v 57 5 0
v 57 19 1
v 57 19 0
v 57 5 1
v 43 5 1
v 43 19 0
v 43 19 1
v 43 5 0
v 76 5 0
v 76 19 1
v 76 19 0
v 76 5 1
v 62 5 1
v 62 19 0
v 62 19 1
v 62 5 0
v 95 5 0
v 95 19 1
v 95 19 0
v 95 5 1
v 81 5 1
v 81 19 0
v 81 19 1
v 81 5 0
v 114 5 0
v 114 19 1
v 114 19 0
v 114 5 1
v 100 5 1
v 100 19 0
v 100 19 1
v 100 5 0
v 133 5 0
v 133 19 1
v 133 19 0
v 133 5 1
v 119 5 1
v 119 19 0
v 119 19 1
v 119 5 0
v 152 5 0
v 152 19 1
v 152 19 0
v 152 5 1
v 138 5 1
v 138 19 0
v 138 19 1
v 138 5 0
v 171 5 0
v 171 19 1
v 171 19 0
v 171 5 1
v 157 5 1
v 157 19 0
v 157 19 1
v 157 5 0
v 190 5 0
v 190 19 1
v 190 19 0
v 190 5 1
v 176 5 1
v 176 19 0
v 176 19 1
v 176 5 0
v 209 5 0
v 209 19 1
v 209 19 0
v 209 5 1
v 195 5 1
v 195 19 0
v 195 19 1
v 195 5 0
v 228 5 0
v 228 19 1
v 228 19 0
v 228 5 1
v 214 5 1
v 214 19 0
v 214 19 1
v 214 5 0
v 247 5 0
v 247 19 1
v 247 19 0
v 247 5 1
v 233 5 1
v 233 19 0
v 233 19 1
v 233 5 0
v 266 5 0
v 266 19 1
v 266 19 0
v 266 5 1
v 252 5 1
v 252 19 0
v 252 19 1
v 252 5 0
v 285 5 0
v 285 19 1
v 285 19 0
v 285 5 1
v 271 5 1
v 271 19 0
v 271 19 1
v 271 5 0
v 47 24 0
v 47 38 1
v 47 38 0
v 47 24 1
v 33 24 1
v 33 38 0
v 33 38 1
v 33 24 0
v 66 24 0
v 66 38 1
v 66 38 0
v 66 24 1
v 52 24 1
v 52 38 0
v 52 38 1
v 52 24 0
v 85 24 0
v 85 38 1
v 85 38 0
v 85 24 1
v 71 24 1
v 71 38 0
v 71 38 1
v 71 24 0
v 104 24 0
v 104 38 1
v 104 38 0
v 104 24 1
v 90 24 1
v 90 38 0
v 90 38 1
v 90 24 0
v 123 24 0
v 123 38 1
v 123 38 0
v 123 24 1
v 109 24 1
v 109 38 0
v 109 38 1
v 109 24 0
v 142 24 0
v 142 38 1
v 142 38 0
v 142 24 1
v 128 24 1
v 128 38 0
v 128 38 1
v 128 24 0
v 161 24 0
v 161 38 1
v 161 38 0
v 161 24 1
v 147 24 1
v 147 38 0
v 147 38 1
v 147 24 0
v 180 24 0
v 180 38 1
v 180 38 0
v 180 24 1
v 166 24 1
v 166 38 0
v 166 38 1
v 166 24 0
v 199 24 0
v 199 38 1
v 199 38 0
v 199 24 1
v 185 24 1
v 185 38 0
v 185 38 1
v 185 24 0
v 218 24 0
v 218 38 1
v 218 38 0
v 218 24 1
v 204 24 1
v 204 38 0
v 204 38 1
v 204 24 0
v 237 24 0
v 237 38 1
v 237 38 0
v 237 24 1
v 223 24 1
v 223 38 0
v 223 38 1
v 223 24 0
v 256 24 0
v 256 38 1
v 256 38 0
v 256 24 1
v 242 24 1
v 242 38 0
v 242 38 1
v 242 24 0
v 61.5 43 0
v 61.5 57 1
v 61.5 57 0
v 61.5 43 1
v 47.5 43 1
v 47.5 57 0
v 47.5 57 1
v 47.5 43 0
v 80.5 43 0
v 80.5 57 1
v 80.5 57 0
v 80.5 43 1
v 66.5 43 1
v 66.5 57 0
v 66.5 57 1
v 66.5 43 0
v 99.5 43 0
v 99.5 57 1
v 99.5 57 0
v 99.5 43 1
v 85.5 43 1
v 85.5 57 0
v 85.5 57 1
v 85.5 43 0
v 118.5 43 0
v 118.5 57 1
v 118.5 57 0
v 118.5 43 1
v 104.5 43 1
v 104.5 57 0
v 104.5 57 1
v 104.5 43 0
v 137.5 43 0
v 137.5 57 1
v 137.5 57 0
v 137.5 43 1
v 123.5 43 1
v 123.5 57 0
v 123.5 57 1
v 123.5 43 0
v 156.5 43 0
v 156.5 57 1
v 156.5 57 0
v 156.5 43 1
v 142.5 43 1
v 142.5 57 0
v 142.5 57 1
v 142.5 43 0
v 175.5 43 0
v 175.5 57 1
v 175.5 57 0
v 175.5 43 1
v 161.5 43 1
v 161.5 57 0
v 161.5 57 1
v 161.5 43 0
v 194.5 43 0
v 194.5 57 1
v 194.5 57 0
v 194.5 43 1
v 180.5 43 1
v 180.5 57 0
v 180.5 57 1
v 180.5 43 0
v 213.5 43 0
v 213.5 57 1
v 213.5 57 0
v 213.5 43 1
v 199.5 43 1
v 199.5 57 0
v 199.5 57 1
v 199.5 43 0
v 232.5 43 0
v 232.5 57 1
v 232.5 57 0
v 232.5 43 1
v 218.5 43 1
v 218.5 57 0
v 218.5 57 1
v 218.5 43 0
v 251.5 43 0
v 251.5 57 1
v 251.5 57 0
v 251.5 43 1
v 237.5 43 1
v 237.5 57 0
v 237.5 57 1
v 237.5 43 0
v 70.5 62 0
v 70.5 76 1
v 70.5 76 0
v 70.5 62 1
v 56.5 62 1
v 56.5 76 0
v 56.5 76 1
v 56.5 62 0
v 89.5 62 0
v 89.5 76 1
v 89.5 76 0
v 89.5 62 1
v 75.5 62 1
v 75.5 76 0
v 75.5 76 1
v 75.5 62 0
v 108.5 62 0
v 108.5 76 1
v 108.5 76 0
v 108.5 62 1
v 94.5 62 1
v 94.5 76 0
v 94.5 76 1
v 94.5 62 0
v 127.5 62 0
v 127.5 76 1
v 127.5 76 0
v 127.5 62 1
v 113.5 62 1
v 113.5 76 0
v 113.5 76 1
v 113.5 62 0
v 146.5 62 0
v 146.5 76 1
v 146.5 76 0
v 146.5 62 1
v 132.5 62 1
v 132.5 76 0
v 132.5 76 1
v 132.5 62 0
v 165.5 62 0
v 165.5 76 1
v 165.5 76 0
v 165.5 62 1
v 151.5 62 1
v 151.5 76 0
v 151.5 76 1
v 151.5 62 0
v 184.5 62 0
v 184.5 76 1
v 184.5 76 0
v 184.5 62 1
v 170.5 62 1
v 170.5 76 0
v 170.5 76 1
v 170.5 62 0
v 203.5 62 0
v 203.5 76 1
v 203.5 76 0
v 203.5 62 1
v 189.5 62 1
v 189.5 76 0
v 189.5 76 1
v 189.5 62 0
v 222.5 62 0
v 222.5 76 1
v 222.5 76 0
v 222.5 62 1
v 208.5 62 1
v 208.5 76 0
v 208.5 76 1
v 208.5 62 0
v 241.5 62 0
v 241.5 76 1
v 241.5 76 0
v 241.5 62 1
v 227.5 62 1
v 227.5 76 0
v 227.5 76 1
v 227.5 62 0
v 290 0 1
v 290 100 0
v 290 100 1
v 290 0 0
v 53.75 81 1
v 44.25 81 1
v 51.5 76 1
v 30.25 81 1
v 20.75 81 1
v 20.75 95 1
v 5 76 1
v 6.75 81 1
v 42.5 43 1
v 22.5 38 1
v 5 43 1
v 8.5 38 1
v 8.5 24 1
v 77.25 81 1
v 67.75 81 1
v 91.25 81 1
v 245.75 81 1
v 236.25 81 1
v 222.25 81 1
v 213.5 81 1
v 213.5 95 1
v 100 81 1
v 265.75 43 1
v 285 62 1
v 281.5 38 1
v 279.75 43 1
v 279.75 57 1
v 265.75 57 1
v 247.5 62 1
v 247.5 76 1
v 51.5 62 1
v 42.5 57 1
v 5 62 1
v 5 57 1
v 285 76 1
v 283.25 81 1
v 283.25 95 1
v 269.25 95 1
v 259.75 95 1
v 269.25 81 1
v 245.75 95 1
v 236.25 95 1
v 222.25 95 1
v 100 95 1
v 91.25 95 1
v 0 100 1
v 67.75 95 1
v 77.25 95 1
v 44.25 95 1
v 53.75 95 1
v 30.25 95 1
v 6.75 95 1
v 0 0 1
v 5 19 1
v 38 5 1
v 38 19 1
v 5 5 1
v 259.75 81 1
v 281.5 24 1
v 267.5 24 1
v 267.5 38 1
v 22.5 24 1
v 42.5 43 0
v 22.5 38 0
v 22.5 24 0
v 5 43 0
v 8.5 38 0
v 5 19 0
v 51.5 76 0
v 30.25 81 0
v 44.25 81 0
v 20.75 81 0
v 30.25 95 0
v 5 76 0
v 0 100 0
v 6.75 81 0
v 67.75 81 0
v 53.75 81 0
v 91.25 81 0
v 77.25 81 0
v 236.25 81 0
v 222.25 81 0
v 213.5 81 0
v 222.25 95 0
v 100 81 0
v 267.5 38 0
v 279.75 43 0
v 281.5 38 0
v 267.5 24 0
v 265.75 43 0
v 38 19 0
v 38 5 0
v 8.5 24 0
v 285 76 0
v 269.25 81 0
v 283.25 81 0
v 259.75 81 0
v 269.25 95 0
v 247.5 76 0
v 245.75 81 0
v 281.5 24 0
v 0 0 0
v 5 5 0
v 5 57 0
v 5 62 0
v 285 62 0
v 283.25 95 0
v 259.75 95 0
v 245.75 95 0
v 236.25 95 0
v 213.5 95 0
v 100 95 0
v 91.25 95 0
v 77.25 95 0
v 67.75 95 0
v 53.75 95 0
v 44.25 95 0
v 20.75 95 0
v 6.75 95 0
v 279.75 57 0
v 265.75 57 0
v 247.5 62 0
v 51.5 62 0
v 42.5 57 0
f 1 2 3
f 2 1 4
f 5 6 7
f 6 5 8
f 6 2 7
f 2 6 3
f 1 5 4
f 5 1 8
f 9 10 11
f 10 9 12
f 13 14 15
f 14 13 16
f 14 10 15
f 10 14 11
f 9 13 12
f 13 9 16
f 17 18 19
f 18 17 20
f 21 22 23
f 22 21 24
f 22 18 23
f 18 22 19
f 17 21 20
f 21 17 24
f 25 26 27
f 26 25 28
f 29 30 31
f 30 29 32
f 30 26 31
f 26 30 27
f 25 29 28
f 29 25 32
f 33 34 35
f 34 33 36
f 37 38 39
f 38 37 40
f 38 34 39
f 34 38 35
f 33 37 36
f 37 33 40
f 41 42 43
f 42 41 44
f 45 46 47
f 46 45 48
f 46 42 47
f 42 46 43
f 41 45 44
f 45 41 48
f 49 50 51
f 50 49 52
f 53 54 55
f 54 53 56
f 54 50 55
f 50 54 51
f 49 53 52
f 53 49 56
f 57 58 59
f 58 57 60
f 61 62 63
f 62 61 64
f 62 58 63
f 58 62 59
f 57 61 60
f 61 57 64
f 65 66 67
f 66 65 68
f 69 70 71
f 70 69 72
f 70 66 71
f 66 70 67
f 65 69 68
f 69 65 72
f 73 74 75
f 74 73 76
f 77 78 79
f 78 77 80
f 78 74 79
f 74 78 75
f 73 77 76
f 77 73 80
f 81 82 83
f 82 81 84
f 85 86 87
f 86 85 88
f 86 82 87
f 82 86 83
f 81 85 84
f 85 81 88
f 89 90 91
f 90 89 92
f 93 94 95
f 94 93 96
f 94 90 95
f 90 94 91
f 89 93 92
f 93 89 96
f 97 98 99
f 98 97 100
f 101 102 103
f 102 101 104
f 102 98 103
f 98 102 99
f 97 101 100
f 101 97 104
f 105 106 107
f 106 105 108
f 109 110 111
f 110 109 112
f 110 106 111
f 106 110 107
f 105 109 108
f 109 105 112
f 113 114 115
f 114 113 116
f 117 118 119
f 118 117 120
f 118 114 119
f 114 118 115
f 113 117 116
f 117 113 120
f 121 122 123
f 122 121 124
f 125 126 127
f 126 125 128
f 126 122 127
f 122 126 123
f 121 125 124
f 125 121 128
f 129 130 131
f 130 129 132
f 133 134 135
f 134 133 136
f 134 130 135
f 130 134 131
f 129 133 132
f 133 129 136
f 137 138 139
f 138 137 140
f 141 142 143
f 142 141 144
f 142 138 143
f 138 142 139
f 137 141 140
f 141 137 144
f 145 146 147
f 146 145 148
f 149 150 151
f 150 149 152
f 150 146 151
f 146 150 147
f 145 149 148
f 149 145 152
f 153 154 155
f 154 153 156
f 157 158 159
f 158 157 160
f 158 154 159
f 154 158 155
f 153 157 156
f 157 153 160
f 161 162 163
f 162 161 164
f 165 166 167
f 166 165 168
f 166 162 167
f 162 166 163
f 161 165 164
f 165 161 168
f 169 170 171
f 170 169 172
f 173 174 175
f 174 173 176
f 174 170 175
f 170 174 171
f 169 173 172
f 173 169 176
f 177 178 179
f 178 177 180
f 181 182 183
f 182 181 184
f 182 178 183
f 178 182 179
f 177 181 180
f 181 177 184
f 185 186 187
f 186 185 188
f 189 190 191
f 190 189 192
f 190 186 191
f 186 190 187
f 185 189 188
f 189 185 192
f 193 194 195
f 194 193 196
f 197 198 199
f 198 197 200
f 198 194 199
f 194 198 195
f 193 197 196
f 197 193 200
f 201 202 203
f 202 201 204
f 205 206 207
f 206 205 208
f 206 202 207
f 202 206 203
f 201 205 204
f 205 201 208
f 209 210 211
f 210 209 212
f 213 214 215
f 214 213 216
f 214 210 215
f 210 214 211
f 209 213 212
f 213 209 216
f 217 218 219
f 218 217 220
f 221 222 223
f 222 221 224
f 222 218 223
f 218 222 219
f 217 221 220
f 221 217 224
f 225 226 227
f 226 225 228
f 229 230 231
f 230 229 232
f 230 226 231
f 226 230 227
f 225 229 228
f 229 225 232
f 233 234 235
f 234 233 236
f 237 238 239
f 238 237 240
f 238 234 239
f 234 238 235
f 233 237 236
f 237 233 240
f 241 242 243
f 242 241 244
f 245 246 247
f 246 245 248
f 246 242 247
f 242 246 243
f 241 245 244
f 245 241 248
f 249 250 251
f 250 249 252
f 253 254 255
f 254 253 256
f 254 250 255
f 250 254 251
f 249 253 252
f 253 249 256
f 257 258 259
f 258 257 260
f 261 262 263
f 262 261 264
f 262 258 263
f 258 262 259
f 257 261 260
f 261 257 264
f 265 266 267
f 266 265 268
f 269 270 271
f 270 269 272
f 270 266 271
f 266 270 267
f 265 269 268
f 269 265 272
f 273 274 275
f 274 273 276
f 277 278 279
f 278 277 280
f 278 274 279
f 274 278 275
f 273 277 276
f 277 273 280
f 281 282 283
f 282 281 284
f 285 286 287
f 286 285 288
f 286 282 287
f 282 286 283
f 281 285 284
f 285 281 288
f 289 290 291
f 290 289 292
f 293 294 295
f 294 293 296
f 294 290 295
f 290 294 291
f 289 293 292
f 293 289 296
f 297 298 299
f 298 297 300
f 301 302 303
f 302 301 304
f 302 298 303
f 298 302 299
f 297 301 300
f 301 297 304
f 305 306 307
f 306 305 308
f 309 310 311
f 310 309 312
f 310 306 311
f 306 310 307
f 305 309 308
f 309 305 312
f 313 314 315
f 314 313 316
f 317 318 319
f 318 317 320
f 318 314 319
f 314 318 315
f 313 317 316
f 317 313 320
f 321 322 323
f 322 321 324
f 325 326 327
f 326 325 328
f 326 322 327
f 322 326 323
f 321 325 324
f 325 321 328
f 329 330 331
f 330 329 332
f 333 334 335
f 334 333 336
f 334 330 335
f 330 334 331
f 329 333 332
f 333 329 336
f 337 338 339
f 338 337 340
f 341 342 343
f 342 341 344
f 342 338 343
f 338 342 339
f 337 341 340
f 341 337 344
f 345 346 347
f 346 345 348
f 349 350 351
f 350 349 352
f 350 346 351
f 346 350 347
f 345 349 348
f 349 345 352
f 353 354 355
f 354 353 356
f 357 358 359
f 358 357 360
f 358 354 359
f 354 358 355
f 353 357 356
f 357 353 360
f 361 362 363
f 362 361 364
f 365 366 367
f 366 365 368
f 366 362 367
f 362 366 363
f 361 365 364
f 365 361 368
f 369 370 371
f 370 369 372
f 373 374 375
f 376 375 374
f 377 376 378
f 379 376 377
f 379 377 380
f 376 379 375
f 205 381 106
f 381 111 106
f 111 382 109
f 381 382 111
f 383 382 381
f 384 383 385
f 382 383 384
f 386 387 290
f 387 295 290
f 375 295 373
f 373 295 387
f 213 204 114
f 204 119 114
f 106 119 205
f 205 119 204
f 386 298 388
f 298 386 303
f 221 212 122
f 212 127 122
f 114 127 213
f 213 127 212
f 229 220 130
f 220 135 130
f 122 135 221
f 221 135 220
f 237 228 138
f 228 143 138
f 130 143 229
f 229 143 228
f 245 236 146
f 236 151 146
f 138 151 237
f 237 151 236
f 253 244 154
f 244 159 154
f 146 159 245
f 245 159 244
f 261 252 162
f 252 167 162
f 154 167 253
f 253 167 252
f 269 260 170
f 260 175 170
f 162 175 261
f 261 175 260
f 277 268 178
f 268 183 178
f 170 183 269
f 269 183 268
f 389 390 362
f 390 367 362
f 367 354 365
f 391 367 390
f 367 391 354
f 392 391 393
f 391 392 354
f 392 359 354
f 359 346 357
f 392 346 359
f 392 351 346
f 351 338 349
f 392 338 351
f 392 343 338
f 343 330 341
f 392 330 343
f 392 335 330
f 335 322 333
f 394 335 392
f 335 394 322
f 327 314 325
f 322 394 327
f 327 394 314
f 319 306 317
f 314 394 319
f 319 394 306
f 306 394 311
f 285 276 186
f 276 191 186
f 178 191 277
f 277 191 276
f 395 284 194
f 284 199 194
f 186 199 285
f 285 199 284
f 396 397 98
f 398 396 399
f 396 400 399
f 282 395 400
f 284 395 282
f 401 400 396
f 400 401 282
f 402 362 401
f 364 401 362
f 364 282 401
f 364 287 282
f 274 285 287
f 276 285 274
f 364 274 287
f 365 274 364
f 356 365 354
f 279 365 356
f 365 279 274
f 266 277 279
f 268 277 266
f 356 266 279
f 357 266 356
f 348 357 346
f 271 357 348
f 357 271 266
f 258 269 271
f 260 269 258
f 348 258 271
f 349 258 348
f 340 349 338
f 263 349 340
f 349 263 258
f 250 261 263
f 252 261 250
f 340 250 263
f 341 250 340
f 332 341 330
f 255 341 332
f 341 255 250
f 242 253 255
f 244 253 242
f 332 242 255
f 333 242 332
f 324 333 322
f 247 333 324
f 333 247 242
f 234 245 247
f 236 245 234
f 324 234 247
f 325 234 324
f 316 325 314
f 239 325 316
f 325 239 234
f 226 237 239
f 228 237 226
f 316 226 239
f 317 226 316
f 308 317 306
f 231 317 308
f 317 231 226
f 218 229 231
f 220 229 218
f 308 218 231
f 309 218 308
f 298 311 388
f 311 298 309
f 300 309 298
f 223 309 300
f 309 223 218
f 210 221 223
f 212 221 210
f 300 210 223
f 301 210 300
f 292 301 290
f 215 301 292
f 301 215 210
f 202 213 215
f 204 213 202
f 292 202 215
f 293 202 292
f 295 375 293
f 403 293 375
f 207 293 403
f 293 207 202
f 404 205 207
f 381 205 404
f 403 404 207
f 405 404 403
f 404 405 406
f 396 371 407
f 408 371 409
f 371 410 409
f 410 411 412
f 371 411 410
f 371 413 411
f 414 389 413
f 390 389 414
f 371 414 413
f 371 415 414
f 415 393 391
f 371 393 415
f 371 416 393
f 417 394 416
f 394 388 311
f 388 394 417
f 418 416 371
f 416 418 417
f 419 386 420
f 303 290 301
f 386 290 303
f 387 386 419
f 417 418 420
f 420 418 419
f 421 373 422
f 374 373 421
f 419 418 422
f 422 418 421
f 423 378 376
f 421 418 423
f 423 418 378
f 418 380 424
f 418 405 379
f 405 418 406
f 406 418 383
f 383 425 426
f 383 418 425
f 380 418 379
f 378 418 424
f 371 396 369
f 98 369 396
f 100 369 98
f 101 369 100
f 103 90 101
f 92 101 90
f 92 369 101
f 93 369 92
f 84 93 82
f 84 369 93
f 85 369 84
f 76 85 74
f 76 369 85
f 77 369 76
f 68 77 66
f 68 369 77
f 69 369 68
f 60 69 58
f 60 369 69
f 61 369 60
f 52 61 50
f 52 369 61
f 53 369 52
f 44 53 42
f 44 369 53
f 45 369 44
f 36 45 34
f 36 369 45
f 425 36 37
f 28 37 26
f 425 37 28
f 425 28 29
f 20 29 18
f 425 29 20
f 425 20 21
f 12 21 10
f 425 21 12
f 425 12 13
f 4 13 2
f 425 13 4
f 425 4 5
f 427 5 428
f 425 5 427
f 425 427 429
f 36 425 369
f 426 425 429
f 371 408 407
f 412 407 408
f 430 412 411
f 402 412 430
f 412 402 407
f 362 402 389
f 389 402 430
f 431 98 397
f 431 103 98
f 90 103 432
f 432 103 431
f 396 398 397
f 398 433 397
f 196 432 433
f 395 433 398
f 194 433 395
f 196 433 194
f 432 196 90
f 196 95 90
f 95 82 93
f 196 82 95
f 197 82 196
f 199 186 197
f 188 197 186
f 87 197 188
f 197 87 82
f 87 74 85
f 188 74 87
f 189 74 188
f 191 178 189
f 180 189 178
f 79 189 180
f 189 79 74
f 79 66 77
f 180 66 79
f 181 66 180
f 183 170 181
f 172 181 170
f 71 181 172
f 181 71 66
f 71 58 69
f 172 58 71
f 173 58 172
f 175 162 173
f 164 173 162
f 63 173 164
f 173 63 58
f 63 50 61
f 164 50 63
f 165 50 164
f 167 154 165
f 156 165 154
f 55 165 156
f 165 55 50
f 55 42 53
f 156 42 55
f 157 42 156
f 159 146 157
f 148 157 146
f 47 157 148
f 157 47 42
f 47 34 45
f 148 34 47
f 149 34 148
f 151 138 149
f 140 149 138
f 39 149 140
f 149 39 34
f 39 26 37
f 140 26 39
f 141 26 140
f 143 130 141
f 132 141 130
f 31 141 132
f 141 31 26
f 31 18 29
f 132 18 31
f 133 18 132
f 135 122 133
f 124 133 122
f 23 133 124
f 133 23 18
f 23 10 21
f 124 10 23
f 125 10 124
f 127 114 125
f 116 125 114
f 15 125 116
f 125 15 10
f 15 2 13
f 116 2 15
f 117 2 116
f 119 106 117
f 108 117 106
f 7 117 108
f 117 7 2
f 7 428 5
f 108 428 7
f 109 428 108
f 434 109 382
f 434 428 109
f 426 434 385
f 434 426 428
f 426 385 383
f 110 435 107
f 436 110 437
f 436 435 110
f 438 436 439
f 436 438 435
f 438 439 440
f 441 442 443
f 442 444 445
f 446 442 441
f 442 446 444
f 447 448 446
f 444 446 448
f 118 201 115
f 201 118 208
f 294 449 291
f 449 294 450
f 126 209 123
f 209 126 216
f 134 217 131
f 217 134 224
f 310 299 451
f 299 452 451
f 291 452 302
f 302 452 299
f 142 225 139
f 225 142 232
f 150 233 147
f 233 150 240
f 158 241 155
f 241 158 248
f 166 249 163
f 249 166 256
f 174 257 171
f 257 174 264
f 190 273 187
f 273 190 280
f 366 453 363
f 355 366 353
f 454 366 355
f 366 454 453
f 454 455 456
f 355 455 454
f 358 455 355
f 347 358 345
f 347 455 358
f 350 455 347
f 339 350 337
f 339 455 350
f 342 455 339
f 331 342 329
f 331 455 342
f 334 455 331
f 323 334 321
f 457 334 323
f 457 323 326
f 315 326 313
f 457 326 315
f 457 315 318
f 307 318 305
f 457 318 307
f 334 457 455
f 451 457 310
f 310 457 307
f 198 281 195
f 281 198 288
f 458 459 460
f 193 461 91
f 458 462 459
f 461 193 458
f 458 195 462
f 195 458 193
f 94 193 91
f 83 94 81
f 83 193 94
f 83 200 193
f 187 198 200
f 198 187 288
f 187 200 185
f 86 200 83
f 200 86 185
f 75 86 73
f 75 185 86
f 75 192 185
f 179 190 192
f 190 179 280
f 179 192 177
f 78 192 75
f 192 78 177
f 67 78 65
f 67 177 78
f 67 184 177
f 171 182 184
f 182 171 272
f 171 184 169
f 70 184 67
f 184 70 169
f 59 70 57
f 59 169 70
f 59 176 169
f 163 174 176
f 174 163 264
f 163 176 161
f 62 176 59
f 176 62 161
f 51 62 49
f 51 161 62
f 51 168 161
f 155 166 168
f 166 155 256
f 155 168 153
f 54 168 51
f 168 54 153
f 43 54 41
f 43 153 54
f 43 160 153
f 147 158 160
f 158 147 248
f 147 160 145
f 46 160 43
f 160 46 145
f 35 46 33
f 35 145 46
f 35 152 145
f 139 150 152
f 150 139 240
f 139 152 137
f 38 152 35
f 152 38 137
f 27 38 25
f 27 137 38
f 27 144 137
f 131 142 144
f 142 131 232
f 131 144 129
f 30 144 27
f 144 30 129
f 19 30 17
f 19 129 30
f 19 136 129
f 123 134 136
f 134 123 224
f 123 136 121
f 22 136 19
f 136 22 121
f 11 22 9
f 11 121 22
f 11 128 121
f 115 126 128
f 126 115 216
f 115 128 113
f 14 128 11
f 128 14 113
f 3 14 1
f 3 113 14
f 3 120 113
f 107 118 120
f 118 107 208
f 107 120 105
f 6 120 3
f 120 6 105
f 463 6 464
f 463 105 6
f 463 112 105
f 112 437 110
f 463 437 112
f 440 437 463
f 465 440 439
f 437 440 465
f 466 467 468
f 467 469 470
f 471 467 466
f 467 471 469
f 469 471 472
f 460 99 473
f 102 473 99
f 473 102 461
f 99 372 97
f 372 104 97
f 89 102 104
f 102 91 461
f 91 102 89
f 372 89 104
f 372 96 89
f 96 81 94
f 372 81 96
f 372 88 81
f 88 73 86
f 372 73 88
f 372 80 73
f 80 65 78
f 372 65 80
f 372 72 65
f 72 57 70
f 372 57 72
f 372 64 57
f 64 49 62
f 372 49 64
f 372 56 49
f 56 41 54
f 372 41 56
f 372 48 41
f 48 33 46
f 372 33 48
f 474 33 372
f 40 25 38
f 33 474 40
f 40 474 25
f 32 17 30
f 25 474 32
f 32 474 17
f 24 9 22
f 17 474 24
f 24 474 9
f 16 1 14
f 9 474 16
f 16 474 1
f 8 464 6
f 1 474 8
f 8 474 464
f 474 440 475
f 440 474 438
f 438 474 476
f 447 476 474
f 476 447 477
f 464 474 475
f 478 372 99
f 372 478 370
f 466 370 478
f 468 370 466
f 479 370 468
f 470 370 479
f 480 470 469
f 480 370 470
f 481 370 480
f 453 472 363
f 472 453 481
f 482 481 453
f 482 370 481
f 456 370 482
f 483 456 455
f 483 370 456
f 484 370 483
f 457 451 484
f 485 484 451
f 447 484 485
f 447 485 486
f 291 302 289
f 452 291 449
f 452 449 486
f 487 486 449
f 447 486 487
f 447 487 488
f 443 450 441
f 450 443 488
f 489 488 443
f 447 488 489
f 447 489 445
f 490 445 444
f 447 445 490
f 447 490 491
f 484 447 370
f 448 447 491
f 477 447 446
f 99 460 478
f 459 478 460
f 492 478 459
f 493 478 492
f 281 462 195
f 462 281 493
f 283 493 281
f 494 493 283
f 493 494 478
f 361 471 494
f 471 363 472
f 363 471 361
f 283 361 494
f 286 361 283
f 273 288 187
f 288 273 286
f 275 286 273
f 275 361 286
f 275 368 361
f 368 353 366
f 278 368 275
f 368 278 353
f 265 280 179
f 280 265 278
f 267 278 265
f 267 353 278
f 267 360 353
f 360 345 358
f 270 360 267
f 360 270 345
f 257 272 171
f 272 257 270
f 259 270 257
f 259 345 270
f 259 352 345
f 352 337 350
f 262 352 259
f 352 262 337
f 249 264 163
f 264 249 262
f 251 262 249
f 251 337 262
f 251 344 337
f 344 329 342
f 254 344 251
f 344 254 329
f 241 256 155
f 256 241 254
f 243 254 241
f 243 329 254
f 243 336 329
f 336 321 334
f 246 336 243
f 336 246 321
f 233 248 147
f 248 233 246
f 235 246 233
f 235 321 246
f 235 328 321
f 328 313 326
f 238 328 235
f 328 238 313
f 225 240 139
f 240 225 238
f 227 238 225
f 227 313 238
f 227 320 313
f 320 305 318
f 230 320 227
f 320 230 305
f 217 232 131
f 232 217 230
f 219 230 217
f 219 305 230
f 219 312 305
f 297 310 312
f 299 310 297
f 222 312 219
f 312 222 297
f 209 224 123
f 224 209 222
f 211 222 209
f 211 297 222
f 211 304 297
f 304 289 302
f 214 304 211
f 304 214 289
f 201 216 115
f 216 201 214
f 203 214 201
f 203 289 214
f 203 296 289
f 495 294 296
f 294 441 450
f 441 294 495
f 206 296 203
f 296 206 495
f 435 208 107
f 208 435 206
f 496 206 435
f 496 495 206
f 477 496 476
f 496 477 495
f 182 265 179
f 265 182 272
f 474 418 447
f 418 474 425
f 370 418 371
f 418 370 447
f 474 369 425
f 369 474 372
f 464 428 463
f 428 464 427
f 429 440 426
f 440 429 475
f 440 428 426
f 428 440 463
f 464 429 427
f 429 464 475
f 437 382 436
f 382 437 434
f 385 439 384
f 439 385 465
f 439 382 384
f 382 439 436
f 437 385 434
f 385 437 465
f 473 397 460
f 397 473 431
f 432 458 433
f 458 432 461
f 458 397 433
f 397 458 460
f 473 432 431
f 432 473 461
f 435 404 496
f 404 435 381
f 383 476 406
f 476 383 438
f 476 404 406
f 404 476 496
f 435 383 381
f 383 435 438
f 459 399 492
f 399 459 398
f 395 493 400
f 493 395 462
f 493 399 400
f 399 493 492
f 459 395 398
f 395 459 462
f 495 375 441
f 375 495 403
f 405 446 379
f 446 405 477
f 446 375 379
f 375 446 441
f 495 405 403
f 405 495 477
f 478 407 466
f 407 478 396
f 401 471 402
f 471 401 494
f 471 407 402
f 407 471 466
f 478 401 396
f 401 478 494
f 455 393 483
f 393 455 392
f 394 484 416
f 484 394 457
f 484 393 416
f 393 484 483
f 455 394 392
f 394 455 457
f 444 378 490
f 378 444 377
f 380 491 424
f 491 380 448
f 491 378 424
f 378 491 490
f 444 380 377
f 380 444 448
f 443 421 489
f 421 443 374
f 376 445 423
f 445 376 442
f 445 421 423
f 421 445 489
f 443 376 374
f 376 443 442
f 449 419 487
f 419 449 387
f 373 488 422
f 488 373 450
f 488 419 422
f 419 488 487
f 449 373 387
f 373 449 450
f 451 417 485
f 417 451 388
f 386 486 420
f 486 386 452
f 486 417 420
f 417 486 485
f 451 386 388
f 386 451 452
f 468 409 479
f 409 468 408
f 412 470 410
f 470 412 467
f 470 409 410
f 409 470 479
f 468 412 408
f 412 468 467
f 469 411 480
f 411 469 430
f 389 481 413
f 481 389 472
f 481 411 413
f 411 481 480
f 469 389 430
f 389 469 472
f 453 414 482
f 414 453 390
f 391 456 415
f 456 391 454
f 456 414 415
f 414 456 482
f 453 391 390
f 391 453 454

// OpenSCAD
// constants 
ROWS=5;
COLS=15;
X_PADDING=5;
Y_PADDING=5;
STD_KEY_WIDTH=14;
STD_KEY_HEIGHT=14;
STD_CTC_DIFF_X= X_PADDING + STD_KEY_HEIGHT;
STD_CTC_DIFF_Y= Y_PADDING + STD_KEY_WIDTH;
MAX_X = X_PADDING + COLS*STD_CTC_DIFF_X;
MAX_Y = Y_PADDING + ROWS*STD_CTC_DIFF_Y;

// zero indexed row offset for y
function y_row_offset(idx) = Y_PADDING + idx*(STD_CTC_DIFF_Y);

// getting x offset for given num_keys 
function x_key_offset(num_keys,size=1) = num_keys*(STD_CTC_DIFF_X*size);

function key_width(size) = ( 
  size 
    ? STD_KEY_WIDTH*size + floor((size-1)*X_PADDING) 
    : 0
);


// offset for single key larger than 1u 
function large_key_offset(size) = (
  2*X_PADDING 
  + STD_KEY_WIDTH*size 
  + floor((size-1)*X_PADDING)
); 

// standard switch mounting hole 
module sized_switch_mount(trans_vect,size=1) {
   translate(trans_vect)
     cube([
       key_width(size),
       STD_KEY_HEIGHT,
       1.2
      ]);   
};

// large key right adjusted 
module large_key_right (key_size, row, hole_size, offset=0) {
  sized_switch_mount(
    [
      ( X_PADDING 
        + ((key_size-hole_size)*STD_KEY_WIDTH) / 2
        + ( offset ? key_width(offset) + 5 : 0 )
      ), 
      y_row_offset(row),
     -0.1
    ],
    hole_size
  );
}

// large key left adjusted
module large_key_left (key_size, row, hole_size, offset=0) {
  sized_switch_mount(
    [ 
      MAX_X - (
        X_PADDING 
        + ((key_size-hole_size)*STD_KEY_WIDTH) / 2
        + key_width(hole_size)
        + ( offset ? key_width(offset) + 5 : 0 ) 
      ),
      y_row_offset(row),
      -0.1
    ],
    hole_size
  );
}


// row of consecutive 1u keys 
module one_u_row(x_edge_offset, y_edge_offset, num_keys) {
  end_range = -1 + x_edge_offset + (STD_CTC_DIFF_X*num_keys);
  for (i=[x_edge_offset:STD_CTC_DIFF_X:end_range]) {
    sized_switch_mount([i,y_edge_offset, -0.1]);
  }
};

module cons_xu_row( x_edge_offset, y_edge_offset, size, numkeys) {
  end_range = -1 + x_edge_offset + (STD_CTC_DIFF_X*num_keys*size);
  for (i=[x_edge_offset:STD_CTC_DIFF_X*size:end_range]) {
    sized_switch_mount([i,y_edge_offset,-0.1], size); 
  }  
};

// bare plate with no holes 
module plate( rows , cols ) {
  cube([
    MAX_X,
    MAX_Y,
    1
  ]);
};

// 60% keyboard plate 
module sixty_ansi_layout () {
  difference (){
    plate(ROWS,COLS);
  
    // row 0 
    large_key_right(key_size=2,row=0,hole_size=2);
    one_u_row(
      x_edge_offset=large_key_offset(2),
      y_edge_offset=y_row_offset(0),
      num_keys=13
    );
  
    // row 1 
    large_key_right(key_size=1.5,row=1,hole_size=1);
    one_u_row(
      x_edge_offset=large_key_offset(1.5),
      y_edge_offset=y_row_offset(1),
      num_keys=12
    );
    large_key_left(key_size=1.5,row=1,hole_size=1);
    
    // row 2
    large_key_right(key_size=2.25,row=2,hole_size=2.25);
    one_u_row(
      x_edge_offset=large_key_offset(2.25),
      y_edge_offset=y_row_offset(2),
      num_keys=11
    );
    large_key_left(key_size=1.75,row=2,hole_size=1);
  
    // row 3 
    large_key_right(key_size=2.75,row=3,hole_size=2.75);
    one_u_row(
      x_edge_offset=large_key_offset(2.75),
      y_edge_offset=y_row_offset(3),
      num_keys=10
    );
    large_key_left(key_size=2.25, row=3, hole_size=2.25);
  
    // row 4
    //large_key_right(key_size=1.25*4, row=4, hole_size=1.25*4);
    large_key_right(key_size=6.25, row=4, hole_size=6.25, offset=4*1.25);
    //large_key_left(key_size=1.25*3, row=4, hole_size=1.25*3);
    large_key_right(key_size=1.25, row=4, hole_size=1);
    large_key_right(key_size=1.25, row=4, hole_size=1, offset=1.25);
    large_key_right(key_size=1.25, row=4, hole_size=1, offset=2.5);
    large_key_right(key_size=1.25, row=4, hole_size=1, offset=3.75);
    large_key_left(key_size=1.25, row=4, hole_size=1);
    large_key_left(key_size=1.25, row=4, hole_size=1, offset=1.25);
    large_key_left(key_size=1.25, row=4, hole_size=1, offset=2.5);
  };
};

sixty_ansi_layout(); 
